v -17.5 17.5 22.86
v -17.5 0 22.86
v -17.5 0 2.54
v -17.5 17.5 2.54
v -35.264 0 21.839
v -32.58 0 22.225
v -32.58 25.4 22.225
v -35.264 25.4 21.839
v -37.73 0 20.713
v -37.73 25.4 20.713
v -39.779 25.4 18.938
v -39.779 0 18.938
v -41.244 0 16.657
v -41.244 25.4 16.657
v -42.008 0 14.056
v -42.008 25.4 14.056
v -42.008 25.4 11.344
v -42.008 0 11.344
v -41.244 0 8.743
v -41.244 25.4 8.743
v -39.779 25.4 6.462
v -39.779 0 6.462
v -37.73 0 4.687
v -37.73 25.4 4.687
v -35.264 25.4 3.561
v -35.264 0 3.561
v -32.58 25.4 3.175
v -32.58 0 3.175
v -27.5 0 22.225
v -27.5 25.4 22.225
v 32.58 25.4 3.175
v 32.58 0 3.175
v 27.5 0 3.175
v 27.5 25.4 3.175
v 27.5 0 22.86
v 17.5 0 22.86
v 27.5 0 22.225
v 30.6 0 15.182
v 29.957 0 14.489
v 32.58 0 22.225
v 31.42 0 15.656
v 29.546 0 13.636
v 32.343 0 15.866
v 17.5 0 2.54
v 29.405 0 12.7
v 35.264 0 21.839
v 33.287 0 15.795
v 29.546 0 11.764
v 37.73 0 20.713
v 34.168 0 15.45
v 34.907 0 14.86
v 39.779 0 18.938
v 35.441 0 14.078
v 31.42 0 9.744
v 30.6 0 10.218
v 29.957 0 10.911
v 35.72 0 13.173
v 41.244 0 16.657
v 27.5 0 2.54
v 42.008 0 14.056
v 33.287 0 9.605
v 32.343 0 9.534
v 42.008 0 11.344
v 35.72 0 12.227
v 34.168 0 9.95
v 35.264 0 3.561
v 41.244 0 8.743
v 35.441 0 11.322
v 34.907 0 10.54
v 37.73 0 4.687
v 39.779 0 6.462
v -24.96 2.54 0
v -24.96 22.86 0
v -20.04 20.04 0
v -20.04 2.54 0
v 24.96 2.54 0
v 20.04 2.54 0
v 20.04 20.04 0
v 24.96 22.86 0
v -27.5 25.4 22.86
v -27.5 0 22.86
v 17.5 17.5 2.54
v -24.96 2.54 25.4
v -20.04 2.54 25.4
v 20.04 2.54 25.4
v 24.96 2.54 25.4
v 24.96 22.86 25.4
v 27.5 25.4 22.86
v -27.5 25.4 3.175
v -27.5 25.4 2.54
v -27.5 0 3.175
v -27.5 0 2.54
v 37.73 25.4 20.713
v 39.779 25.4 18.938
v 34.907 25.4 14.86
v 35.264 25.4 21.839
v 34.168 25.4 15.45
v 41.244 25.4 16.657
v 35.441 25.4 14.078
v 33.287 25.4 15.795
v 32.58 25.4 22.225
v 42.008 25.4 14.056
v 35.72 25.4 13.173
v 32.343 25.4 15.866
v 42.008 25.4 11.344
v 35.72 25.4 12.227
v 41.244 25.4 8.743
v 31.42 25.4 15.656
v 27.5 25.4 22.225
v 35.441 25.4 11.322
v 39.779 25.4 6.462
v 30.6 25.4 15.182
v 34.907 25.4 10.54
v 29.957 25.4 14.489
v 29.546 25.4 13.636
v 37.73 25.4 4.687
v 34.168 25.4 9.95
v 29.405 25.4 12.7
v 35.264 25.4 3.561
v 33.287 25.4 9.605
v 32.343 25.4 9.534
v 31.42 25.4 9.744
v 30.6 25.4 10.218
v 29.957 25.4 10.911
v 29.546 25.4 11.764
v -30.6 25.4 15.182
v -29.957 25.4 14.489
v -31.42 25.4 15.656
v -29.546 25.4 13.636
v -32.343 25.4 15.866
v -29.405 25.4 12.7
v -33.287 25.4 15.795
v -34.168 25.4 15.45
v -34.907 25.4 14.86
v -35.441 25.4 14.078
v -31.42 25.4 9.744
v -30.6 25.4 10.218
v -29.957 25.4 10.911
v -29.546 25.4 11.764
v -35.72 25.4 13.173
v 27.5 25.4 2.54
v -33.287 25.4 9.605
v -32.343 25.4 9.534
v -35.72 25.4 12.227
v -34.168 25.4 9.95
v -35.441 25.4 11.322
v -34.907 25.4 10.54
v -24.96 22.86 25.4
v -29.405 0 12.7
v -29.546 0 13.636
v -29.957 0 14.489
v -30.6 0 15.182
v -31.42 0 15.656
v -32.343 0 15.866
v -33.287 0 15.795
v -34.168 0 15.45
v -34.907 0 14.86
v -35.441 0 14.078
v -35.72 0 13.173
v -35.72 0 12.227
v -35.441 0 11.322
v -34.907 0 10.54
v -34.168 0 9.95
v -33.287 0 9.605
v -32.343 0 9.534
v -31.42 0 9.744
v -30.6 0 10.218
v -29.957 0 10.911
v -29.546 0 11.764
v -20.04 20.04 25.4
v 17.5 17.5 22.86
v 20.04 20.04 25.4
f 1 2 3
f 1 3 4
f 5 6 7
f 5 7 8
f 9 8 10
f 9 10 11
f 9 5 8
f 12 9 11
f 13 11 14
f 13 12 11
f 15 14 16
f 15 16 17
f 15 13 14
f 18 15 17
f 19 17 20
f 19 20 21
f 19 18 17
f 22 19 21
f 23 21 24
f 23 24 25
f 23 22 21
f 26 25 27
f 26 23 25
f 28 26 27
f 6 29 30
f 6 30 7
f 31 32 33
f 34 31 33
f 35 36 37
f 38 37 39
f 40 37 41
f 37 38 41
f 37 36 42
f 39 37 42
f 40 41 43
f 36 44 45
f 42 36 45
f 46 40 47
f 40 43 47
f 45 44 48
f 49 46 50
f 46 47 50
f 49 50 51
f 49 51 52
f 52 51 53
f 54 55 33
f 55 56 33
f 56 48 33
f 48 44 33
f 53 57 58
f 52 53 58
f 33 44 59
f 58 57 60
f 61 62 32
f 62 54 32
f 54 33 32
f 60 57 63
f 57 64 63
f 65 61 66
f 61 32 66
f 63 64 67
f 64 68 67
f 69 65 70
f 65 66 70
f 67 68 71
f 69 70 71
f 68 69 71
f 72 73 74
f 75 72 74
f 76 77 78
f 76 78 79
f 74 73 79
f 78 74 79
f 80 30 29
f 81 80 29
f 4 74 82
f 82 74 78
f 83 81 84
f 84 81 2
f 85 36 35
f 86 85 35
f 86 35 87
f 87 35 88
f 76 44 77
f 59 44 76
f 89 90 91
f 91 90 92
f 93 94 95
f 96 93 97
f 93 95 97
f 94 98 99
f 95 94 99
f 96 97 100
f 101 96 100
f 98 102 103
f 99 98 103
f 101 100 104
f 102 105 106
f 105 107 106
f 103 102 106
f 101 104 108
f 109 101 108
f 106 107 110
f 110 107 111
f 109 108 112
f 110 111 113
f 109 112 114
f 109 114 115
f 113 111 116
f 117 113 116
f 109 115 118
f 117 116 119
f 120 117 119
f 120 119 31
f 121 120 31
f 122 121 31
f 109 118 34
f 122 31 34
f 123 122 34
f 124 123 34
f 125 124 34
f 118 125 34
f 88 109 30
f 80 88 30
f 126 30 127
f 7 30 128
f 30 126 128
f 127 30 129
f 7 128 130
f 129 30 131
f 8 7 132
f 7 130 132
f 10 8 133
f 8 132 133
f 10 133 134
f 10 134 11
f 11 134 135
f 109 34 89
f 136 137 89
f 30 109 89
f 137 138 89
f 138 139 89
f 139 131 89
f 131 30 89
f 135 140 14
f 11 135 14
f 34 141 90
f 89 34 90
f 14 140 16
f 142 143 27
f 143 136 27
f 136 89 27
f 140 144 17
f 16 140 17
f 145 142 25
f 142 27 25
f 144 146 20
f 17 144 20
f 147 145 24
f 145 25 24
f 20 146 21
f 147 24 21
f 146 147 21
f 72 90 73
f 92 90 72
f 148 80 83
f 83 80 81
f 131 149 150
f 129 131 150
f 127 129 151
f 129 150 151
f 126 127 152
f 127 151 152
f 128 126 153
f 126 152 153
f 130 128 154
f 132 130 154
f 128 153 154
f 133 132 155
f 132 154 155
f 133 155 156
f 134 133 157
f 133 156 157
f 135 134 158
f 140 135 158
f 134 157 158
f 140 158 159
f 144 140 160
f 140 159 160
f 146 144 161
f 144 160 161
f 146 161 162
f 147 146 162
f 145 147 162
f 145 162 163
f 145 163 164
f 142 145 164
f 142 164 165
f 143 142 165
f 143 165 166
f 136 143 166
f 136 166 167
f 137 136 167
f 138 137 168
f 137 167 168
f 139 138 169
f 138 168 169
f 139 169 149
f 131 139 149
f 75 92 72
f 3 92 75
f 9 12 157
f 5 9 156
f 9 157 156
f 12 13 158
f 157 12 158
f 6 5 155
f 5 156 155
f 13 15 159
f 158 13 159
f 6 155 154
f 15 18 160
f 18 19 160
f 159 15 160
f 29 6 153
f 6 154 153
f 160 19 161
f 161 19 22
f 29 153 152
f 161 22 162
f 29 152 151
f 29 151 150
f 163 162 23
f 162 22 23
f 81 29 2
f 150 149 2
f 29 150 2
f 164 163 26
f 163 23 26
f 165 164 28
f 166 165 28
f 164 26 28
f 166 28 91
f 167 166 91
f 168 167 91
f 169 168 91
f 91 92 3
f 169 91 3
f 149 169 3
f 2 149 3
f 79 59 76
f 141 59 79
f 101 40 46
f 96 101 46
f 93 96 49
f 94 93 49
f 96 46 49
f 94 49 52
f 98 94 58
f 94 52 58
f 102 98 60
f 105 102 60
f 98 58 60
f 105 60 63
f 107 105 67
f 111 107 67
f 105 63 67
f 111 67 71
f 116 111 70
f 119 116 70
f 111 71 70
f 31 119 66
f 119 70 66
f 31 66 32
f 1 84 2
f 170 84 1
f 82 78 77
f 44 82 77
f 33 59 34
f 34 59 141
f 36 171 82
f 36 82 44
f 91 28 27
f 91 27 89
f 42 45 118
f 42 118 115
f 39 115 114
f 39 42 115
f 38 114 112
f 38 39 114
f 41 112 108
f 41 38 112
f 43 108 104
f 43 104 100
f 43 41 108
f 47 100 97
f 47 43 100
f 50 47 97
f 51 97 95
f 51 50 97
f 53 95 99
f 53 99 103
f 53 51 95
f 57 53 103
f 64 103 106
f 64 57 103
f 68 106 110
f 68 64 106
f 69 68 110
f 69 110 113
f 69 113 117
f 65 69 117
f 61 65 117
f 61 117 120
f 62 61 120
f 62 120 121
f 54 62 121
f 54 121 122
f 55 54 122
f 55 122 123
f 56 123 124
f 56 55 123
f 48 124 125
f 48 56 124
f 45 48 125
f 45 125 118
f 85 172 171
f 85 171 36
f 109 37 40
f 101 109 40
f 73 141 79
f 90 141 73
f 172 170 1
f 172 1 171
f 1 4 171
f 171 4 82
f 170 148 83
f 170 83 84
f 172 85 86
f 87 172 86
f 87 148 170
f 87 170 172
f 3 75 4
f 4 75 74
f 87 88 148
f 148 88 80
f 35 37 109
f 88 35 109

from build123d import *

# Parameters (mm, degrees)
F1_DEPTH = 25.4
F2_R     = 3.175
F3_DEPTH = 25.4
F4_SIZE  = 2.54


with BuildPart() as f1:
    # F0 (on Top) → F1 (new body)
    with BuildSketch(Plane.XY):
        Polygon((-17.5, 17.5), (17.5, 17.5), (17.5, 0), (27.5, 0), (27.5, 25.4), (-27.5, 25.4), (-27.5, 0), (-17.5, 0), align=None)
    extrude(amount=F1_DEPTH)

    # F2 (on Front) → F3 (join)
    with BuildSketch(Plane.XZ):
        with BuildLine():
            Line((-27.5, 3.175), (-27.5, 22.225))
            Line((-27.5, 22.225), (-32.58, 22.225))
            ThreePointArc((-32.58, 22.225), (-42.105, 12.7), (-32.58, 3.175))
            Line((-32.58, 3.175), (-27.5, 3.175))
        make_face()
        with Locations((-32.58, 12.7)):
            Circle(F2_R, mode=Mode.SUBTRACT)
    extrude(amount=-F3_DEPTH)

    # F4
    f4_edges = [f1.edges().sort_by_distance(p)[0] for p in [
        (0, 17.5, 0),
        (17.5, 8.75, 0),
        (22.5, 0, 0),
        (27.5, 12.7, 0),
        (0, 25.4, 0),
        (-27.5, 12.7, 0),
        (-22.5, 0, 0),
        (-17.5, 8.75, 0),
        (0, 17.5, 25.4),
        (17.5, 8.75, 25.4),
        (22.5, 0, 25.4),
        (27.5, 12.7, 25.4),
        (0, 25.4, 25.4),
        (-27.5, 12.7, 25.4),
        (-22.5, 0, 25.4),
        (-17.5, 8.75, 25.4),
    ]]
    chamfer(f4_edges, length=F4_SIZE)

    # F5: F1 across plane


with BuildPart() as f1_1:
    add(f1.part)
    add(f1.part.mirror(Plane.YZ))


solid = f1_1.part
